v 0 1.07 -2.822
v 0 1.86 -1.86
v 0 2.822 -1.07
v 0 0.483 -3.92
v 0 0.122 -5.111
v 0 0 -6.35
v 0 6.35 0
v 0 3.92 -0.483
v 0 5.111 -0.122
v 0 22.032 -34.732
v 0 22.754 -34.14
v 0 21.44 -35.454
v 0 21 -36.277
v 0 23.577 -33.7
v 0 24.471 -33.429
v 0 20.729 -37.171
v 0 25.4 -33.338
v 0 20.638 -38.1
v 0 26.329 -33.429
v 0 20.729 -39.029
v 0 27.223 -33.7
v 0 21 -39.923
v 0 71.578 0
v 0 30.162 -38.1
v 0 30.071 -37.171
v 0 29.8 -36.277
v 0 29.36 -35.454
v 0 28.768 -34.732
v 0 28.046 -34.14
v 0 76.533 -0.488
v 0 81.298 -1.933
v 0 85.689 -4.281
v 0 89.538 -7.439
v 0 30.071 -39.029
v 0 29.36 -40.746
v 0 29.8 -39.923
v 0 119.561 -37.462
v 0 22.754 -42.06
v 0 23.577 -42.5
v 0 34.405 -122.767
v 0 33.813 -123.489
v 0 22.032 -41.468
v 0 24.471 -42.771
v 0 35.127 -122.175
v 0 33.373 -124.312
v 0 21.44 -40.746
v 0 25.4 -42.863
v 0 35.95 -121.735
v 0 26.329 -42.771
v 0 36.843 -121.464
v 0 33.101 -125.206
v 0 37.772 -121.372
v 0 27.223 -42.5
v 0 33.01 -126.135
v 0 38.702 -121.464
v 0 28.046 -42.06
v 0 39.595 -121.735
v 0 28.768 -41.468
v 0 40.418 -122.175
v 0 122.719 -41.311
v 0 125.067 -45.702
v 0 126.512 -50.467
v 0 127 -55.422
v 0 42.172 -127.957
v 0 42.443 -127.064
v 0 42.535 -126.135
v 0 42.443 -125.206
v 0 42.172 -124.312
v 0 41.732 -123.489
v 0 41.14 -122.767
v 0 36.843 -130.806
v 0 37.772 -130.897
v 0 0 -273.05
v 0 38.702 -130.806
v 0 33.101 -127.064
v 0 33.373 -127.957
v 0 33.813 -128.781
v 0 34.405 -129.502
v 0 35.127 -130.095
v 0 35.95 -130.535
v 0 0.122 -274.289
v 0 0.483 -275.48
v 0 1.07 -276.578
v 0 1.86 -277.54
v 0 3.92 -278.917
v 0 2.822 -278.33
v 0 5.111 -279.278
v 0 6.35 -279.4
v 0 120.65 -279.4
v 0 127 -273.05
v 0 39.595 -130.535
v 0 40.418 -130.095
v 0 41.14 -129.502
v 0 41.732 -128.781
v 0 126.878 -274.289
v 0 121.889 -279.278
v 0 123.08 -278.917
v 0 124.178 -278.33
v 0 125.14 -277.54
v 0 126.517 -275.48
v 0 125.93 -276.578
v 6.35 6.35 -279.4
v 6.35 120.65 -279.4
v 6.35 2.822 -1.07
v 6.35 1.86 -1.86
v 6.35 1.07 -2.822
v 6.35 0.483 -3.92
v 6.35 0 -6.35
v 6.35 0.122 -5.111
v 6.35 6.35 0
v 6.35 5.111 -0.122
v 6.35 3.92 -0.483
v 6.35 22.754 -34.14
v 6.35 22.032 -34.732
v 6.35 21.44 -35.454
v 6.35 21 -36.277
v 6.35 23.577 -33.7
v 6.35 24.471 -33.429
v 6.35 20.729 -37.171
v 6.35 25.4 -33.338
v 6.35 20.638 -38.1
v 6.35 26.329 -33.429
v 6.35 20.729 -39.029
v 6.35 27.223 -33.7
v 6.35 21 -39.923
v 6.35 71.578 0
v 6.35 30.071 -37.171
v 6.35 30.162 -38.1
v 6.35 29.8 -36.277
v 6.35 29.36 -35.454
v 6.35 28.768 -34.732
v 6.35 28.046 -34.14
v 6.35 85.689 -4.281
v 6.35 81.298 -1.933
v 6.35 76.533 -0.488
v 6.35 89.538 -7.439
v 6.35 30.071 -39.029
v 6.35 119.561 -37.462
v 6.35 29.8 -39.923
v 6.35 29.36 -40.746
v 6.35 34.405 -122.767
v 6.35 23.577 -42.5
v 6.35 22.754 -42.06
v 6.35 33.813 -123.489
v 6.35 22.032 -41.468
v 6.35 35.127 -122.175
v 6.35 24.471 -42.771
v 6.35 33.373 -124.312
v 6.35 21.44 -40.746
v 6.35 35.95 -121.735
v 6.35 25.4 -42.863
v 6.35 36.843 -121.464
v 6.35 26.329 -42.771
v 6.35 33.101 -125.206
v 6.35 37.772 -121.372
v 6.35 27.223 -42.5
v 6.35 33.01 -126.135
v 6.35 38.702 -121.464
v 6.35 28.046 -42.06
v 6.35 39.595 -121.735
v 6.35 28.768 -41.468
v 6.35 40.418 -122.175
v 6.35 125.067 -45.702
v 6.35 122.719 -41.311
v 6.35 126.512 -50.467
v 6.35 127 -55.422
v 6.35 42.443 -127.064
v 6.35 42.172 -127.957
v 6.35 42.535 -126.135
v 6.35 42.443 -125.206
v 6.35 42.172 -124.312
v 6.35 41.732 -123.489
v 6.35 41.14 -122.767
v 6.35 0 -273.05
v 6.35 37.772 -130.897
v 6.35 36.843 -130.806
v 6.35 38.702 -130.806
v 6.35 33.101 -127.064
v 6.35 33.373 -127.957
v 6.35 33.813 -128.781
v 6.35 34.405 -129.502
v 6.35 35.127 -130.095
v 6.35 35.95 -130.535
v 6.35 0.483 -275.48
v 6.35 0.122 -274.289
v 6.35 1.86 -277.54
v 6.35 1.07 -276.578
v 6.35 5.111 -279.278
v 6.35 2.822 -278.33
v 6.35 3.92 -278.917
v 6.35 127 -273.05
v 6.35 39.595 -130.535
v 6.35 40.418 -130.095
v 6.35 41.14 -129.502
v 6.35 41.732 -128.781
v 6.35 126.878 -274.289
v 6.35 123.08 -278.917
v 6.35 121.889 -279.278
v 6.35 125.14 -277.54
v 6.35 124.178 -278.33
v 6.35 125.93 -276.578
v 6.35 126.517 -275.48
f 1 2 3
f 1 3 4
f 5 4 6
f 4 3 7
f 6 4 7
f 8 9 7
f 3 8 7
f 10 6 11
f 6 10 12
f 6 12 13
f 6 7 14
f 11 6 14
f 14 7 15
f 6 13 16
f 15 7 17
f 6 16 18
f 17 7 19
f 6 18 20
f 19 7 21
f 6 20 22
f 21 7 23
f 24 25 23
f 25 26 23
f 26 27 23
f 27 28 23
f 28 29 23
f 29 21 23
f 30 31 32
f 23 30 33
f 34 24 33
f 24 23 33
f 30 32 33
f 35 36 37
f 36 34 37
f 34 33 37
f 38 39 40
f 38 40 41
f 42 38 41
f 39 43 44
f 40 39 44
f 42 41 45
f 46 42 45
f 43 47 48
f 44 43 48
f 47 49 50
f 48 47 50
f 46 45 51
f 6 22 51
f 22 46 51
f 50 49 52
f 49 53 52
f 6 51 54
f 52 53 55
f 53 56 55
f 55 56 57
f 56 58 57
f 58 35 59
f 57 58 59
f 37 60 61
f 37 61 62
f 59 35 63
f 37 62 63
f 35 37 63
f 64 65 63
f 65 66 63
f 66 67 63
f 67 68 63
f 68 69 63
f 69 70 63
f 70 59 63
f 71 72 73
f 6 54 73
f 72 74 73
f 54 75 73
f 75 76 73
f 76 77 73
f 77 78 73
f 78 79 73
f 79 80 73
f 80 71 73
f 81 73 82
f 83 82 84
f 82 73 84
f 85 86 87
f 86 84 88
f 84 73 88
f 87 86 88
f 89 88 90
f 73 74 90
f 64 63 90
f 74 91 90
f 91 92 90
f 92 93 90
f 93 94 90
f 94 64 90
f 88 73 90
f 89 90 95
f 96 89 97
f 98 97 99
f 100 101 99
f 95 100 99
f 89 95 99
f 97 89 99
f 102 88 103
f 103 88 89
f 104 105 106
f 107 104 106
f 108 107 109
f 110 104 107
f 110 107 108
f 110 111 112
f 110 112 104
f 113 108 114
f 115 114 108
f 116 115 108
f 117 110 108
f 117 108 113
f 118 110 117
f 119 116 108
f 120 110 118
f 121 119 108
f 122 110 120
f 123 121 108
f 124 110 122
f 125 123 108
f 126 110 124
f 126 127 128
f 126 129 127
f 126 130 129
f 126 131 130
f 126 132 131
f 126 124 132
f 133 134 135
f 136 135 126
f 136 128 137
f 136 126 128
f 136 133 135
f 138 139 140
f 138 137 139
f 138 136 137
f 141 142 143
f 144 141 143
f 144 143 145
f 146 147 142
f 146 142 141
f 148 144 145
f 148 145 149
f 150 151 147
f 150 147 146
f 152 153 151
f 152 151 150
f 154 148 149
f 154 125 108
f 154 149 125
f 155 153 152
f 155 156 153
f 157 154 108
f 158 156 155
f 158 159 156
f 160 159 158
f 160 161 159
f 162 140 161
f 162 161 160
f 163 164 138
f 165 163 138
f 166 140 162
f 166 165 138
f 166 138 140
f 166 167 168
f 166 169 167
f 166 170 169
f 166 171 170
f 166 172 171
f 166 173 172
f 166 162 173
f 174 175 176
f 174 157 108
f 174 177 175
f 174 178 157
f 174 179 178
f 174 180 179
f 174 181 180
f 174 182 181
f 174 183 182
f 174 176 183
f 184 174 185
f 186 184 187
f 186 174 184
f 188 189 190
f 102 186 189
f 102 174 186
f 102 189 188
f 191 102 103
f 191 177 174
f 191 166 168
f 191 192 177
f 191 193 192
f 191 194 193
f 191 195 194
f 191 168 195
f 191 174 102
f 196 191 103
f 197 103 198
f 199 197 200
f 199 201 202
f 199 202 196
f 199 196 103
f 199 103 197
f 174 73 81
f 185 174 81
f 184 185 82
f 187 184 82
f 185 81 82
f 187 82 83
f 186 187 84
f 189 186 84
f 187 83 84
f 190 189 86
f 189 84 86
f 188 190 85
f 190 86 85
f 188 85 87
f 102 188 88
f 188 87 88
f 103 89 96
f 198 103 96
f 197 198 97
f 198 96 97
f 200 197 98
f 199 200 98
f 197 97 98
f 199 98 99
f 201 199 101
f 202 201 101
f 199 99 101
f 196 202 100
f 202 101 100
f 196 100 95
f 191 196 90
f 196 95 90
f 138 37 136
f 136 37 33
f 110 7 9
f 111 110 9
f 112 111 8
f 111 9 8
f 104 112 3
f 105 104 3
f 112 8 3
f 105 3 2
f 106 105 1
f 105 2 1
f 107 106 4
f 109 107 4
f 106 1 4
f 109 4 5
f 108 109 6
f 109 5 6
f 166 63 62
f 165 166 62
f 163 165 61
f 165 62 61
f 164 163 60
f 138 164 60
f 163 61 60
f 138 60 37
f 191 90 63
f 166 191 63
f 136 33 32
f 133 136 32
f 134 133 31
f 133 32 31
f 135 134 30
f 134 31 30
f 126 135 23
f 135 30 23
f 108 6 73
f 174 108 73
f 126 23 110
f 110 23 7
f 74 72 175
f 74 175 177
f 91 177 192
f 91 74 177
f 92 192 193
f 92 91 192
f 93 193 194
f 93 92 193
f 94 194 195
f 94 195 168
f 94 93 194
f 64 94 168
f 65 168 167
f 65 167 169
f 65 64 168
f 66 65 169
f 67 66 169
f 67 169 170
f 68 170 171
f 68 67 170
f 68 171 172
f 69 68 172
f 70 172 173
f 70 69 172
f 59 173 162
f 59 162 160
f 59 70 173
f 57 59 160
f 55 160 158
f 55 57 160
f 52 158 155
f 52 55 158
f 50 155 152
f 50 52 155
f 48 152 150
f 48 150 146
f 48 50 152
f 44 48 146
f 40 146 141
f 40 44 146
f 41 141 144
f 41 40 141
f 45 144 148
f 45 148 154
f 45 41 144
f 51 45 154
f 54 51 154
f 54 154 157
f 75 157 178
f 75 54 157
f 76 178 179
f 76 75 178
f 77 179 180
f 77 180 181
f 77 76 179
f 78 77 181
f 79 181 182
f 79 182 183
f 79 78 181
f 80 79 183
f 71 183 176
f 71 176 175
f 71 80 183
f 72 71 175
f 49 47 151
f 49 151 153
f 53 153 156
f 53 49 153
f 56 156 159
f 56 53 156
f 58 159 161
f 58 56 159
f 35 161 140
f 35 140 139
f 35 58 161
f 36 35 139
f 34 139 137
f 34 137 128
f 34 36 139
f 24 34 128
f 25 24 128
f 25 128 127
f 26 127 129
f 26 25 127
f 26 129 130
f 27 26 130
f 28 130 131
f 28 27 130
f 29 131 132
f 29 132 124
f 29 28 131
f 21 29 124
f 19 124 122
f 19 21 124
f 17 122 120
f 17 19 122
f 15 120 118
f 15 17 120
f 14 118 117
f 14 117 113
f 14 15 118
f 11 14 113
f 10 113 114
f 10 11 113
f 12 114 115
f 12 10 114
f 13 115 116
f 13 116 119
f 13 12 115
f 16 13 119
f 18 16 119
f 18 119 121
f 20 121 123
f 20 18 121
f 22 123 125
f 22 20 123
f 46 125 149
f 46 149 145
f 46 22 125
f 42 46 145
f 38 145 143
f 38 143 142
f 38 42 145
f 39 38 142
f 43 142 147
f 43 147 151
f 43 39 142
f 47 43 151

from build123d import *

# Parameters (mm, degrees)
SKETCH1_R           = 4.7625
BOSS_EXTRUDE1_DEPTH = 6.35


with BuildPart() as part:
    # Sketch1 → Boss-Extrude1 (new body)
    with BuildSketch(Plane(origin=(0, 0, 0), x_dir=(0, 0, -1), z_dir=(1, 0, 0))):
        with BuildLine():
            Line((6.35, 0), (273.05, 0))
            ThreePointArc((273.05, 0), (277.540128061, 1.859871939), (279.4, 6.35))
            Line((279.4, 6.35), (279.4, 120.65))
            ThreePointArc((279.4, 120.65), (277.540128061, 125.140128061), (273.05, 127))
            Line((273.05, 127), (55.42230509, 127))
            ThreePointArc((55.42230509, 127), (45.702145908, 125.066540126), (37.461792847, 119.560512242))
            Line((37.461792847, 119.560512242), (7.439487758, 89.538207153))
            ThreePointArc((7.439487758, 89.538207153), (1.933459874, 81.297854092), (0, 71.57769491))
            Line((0, 71.57769491), (0, 6.35))
            ThreePointArc((0, 6.35), (1.859871939, 1.859871939), (6.35, 0))
        make_face()
        with Locations((38.1, 25.4)):
            Circle(SKETCH1_R, mode=Mode.SUBTRACT)
        with Locations((126.134831311, 37.772488675)):
            Circle(SKETCH1_R, mode=Mode.SUBTRACT)
    extrude(amount=BOSS_EXTRUDE1_DEPTH)


solid = part.part
